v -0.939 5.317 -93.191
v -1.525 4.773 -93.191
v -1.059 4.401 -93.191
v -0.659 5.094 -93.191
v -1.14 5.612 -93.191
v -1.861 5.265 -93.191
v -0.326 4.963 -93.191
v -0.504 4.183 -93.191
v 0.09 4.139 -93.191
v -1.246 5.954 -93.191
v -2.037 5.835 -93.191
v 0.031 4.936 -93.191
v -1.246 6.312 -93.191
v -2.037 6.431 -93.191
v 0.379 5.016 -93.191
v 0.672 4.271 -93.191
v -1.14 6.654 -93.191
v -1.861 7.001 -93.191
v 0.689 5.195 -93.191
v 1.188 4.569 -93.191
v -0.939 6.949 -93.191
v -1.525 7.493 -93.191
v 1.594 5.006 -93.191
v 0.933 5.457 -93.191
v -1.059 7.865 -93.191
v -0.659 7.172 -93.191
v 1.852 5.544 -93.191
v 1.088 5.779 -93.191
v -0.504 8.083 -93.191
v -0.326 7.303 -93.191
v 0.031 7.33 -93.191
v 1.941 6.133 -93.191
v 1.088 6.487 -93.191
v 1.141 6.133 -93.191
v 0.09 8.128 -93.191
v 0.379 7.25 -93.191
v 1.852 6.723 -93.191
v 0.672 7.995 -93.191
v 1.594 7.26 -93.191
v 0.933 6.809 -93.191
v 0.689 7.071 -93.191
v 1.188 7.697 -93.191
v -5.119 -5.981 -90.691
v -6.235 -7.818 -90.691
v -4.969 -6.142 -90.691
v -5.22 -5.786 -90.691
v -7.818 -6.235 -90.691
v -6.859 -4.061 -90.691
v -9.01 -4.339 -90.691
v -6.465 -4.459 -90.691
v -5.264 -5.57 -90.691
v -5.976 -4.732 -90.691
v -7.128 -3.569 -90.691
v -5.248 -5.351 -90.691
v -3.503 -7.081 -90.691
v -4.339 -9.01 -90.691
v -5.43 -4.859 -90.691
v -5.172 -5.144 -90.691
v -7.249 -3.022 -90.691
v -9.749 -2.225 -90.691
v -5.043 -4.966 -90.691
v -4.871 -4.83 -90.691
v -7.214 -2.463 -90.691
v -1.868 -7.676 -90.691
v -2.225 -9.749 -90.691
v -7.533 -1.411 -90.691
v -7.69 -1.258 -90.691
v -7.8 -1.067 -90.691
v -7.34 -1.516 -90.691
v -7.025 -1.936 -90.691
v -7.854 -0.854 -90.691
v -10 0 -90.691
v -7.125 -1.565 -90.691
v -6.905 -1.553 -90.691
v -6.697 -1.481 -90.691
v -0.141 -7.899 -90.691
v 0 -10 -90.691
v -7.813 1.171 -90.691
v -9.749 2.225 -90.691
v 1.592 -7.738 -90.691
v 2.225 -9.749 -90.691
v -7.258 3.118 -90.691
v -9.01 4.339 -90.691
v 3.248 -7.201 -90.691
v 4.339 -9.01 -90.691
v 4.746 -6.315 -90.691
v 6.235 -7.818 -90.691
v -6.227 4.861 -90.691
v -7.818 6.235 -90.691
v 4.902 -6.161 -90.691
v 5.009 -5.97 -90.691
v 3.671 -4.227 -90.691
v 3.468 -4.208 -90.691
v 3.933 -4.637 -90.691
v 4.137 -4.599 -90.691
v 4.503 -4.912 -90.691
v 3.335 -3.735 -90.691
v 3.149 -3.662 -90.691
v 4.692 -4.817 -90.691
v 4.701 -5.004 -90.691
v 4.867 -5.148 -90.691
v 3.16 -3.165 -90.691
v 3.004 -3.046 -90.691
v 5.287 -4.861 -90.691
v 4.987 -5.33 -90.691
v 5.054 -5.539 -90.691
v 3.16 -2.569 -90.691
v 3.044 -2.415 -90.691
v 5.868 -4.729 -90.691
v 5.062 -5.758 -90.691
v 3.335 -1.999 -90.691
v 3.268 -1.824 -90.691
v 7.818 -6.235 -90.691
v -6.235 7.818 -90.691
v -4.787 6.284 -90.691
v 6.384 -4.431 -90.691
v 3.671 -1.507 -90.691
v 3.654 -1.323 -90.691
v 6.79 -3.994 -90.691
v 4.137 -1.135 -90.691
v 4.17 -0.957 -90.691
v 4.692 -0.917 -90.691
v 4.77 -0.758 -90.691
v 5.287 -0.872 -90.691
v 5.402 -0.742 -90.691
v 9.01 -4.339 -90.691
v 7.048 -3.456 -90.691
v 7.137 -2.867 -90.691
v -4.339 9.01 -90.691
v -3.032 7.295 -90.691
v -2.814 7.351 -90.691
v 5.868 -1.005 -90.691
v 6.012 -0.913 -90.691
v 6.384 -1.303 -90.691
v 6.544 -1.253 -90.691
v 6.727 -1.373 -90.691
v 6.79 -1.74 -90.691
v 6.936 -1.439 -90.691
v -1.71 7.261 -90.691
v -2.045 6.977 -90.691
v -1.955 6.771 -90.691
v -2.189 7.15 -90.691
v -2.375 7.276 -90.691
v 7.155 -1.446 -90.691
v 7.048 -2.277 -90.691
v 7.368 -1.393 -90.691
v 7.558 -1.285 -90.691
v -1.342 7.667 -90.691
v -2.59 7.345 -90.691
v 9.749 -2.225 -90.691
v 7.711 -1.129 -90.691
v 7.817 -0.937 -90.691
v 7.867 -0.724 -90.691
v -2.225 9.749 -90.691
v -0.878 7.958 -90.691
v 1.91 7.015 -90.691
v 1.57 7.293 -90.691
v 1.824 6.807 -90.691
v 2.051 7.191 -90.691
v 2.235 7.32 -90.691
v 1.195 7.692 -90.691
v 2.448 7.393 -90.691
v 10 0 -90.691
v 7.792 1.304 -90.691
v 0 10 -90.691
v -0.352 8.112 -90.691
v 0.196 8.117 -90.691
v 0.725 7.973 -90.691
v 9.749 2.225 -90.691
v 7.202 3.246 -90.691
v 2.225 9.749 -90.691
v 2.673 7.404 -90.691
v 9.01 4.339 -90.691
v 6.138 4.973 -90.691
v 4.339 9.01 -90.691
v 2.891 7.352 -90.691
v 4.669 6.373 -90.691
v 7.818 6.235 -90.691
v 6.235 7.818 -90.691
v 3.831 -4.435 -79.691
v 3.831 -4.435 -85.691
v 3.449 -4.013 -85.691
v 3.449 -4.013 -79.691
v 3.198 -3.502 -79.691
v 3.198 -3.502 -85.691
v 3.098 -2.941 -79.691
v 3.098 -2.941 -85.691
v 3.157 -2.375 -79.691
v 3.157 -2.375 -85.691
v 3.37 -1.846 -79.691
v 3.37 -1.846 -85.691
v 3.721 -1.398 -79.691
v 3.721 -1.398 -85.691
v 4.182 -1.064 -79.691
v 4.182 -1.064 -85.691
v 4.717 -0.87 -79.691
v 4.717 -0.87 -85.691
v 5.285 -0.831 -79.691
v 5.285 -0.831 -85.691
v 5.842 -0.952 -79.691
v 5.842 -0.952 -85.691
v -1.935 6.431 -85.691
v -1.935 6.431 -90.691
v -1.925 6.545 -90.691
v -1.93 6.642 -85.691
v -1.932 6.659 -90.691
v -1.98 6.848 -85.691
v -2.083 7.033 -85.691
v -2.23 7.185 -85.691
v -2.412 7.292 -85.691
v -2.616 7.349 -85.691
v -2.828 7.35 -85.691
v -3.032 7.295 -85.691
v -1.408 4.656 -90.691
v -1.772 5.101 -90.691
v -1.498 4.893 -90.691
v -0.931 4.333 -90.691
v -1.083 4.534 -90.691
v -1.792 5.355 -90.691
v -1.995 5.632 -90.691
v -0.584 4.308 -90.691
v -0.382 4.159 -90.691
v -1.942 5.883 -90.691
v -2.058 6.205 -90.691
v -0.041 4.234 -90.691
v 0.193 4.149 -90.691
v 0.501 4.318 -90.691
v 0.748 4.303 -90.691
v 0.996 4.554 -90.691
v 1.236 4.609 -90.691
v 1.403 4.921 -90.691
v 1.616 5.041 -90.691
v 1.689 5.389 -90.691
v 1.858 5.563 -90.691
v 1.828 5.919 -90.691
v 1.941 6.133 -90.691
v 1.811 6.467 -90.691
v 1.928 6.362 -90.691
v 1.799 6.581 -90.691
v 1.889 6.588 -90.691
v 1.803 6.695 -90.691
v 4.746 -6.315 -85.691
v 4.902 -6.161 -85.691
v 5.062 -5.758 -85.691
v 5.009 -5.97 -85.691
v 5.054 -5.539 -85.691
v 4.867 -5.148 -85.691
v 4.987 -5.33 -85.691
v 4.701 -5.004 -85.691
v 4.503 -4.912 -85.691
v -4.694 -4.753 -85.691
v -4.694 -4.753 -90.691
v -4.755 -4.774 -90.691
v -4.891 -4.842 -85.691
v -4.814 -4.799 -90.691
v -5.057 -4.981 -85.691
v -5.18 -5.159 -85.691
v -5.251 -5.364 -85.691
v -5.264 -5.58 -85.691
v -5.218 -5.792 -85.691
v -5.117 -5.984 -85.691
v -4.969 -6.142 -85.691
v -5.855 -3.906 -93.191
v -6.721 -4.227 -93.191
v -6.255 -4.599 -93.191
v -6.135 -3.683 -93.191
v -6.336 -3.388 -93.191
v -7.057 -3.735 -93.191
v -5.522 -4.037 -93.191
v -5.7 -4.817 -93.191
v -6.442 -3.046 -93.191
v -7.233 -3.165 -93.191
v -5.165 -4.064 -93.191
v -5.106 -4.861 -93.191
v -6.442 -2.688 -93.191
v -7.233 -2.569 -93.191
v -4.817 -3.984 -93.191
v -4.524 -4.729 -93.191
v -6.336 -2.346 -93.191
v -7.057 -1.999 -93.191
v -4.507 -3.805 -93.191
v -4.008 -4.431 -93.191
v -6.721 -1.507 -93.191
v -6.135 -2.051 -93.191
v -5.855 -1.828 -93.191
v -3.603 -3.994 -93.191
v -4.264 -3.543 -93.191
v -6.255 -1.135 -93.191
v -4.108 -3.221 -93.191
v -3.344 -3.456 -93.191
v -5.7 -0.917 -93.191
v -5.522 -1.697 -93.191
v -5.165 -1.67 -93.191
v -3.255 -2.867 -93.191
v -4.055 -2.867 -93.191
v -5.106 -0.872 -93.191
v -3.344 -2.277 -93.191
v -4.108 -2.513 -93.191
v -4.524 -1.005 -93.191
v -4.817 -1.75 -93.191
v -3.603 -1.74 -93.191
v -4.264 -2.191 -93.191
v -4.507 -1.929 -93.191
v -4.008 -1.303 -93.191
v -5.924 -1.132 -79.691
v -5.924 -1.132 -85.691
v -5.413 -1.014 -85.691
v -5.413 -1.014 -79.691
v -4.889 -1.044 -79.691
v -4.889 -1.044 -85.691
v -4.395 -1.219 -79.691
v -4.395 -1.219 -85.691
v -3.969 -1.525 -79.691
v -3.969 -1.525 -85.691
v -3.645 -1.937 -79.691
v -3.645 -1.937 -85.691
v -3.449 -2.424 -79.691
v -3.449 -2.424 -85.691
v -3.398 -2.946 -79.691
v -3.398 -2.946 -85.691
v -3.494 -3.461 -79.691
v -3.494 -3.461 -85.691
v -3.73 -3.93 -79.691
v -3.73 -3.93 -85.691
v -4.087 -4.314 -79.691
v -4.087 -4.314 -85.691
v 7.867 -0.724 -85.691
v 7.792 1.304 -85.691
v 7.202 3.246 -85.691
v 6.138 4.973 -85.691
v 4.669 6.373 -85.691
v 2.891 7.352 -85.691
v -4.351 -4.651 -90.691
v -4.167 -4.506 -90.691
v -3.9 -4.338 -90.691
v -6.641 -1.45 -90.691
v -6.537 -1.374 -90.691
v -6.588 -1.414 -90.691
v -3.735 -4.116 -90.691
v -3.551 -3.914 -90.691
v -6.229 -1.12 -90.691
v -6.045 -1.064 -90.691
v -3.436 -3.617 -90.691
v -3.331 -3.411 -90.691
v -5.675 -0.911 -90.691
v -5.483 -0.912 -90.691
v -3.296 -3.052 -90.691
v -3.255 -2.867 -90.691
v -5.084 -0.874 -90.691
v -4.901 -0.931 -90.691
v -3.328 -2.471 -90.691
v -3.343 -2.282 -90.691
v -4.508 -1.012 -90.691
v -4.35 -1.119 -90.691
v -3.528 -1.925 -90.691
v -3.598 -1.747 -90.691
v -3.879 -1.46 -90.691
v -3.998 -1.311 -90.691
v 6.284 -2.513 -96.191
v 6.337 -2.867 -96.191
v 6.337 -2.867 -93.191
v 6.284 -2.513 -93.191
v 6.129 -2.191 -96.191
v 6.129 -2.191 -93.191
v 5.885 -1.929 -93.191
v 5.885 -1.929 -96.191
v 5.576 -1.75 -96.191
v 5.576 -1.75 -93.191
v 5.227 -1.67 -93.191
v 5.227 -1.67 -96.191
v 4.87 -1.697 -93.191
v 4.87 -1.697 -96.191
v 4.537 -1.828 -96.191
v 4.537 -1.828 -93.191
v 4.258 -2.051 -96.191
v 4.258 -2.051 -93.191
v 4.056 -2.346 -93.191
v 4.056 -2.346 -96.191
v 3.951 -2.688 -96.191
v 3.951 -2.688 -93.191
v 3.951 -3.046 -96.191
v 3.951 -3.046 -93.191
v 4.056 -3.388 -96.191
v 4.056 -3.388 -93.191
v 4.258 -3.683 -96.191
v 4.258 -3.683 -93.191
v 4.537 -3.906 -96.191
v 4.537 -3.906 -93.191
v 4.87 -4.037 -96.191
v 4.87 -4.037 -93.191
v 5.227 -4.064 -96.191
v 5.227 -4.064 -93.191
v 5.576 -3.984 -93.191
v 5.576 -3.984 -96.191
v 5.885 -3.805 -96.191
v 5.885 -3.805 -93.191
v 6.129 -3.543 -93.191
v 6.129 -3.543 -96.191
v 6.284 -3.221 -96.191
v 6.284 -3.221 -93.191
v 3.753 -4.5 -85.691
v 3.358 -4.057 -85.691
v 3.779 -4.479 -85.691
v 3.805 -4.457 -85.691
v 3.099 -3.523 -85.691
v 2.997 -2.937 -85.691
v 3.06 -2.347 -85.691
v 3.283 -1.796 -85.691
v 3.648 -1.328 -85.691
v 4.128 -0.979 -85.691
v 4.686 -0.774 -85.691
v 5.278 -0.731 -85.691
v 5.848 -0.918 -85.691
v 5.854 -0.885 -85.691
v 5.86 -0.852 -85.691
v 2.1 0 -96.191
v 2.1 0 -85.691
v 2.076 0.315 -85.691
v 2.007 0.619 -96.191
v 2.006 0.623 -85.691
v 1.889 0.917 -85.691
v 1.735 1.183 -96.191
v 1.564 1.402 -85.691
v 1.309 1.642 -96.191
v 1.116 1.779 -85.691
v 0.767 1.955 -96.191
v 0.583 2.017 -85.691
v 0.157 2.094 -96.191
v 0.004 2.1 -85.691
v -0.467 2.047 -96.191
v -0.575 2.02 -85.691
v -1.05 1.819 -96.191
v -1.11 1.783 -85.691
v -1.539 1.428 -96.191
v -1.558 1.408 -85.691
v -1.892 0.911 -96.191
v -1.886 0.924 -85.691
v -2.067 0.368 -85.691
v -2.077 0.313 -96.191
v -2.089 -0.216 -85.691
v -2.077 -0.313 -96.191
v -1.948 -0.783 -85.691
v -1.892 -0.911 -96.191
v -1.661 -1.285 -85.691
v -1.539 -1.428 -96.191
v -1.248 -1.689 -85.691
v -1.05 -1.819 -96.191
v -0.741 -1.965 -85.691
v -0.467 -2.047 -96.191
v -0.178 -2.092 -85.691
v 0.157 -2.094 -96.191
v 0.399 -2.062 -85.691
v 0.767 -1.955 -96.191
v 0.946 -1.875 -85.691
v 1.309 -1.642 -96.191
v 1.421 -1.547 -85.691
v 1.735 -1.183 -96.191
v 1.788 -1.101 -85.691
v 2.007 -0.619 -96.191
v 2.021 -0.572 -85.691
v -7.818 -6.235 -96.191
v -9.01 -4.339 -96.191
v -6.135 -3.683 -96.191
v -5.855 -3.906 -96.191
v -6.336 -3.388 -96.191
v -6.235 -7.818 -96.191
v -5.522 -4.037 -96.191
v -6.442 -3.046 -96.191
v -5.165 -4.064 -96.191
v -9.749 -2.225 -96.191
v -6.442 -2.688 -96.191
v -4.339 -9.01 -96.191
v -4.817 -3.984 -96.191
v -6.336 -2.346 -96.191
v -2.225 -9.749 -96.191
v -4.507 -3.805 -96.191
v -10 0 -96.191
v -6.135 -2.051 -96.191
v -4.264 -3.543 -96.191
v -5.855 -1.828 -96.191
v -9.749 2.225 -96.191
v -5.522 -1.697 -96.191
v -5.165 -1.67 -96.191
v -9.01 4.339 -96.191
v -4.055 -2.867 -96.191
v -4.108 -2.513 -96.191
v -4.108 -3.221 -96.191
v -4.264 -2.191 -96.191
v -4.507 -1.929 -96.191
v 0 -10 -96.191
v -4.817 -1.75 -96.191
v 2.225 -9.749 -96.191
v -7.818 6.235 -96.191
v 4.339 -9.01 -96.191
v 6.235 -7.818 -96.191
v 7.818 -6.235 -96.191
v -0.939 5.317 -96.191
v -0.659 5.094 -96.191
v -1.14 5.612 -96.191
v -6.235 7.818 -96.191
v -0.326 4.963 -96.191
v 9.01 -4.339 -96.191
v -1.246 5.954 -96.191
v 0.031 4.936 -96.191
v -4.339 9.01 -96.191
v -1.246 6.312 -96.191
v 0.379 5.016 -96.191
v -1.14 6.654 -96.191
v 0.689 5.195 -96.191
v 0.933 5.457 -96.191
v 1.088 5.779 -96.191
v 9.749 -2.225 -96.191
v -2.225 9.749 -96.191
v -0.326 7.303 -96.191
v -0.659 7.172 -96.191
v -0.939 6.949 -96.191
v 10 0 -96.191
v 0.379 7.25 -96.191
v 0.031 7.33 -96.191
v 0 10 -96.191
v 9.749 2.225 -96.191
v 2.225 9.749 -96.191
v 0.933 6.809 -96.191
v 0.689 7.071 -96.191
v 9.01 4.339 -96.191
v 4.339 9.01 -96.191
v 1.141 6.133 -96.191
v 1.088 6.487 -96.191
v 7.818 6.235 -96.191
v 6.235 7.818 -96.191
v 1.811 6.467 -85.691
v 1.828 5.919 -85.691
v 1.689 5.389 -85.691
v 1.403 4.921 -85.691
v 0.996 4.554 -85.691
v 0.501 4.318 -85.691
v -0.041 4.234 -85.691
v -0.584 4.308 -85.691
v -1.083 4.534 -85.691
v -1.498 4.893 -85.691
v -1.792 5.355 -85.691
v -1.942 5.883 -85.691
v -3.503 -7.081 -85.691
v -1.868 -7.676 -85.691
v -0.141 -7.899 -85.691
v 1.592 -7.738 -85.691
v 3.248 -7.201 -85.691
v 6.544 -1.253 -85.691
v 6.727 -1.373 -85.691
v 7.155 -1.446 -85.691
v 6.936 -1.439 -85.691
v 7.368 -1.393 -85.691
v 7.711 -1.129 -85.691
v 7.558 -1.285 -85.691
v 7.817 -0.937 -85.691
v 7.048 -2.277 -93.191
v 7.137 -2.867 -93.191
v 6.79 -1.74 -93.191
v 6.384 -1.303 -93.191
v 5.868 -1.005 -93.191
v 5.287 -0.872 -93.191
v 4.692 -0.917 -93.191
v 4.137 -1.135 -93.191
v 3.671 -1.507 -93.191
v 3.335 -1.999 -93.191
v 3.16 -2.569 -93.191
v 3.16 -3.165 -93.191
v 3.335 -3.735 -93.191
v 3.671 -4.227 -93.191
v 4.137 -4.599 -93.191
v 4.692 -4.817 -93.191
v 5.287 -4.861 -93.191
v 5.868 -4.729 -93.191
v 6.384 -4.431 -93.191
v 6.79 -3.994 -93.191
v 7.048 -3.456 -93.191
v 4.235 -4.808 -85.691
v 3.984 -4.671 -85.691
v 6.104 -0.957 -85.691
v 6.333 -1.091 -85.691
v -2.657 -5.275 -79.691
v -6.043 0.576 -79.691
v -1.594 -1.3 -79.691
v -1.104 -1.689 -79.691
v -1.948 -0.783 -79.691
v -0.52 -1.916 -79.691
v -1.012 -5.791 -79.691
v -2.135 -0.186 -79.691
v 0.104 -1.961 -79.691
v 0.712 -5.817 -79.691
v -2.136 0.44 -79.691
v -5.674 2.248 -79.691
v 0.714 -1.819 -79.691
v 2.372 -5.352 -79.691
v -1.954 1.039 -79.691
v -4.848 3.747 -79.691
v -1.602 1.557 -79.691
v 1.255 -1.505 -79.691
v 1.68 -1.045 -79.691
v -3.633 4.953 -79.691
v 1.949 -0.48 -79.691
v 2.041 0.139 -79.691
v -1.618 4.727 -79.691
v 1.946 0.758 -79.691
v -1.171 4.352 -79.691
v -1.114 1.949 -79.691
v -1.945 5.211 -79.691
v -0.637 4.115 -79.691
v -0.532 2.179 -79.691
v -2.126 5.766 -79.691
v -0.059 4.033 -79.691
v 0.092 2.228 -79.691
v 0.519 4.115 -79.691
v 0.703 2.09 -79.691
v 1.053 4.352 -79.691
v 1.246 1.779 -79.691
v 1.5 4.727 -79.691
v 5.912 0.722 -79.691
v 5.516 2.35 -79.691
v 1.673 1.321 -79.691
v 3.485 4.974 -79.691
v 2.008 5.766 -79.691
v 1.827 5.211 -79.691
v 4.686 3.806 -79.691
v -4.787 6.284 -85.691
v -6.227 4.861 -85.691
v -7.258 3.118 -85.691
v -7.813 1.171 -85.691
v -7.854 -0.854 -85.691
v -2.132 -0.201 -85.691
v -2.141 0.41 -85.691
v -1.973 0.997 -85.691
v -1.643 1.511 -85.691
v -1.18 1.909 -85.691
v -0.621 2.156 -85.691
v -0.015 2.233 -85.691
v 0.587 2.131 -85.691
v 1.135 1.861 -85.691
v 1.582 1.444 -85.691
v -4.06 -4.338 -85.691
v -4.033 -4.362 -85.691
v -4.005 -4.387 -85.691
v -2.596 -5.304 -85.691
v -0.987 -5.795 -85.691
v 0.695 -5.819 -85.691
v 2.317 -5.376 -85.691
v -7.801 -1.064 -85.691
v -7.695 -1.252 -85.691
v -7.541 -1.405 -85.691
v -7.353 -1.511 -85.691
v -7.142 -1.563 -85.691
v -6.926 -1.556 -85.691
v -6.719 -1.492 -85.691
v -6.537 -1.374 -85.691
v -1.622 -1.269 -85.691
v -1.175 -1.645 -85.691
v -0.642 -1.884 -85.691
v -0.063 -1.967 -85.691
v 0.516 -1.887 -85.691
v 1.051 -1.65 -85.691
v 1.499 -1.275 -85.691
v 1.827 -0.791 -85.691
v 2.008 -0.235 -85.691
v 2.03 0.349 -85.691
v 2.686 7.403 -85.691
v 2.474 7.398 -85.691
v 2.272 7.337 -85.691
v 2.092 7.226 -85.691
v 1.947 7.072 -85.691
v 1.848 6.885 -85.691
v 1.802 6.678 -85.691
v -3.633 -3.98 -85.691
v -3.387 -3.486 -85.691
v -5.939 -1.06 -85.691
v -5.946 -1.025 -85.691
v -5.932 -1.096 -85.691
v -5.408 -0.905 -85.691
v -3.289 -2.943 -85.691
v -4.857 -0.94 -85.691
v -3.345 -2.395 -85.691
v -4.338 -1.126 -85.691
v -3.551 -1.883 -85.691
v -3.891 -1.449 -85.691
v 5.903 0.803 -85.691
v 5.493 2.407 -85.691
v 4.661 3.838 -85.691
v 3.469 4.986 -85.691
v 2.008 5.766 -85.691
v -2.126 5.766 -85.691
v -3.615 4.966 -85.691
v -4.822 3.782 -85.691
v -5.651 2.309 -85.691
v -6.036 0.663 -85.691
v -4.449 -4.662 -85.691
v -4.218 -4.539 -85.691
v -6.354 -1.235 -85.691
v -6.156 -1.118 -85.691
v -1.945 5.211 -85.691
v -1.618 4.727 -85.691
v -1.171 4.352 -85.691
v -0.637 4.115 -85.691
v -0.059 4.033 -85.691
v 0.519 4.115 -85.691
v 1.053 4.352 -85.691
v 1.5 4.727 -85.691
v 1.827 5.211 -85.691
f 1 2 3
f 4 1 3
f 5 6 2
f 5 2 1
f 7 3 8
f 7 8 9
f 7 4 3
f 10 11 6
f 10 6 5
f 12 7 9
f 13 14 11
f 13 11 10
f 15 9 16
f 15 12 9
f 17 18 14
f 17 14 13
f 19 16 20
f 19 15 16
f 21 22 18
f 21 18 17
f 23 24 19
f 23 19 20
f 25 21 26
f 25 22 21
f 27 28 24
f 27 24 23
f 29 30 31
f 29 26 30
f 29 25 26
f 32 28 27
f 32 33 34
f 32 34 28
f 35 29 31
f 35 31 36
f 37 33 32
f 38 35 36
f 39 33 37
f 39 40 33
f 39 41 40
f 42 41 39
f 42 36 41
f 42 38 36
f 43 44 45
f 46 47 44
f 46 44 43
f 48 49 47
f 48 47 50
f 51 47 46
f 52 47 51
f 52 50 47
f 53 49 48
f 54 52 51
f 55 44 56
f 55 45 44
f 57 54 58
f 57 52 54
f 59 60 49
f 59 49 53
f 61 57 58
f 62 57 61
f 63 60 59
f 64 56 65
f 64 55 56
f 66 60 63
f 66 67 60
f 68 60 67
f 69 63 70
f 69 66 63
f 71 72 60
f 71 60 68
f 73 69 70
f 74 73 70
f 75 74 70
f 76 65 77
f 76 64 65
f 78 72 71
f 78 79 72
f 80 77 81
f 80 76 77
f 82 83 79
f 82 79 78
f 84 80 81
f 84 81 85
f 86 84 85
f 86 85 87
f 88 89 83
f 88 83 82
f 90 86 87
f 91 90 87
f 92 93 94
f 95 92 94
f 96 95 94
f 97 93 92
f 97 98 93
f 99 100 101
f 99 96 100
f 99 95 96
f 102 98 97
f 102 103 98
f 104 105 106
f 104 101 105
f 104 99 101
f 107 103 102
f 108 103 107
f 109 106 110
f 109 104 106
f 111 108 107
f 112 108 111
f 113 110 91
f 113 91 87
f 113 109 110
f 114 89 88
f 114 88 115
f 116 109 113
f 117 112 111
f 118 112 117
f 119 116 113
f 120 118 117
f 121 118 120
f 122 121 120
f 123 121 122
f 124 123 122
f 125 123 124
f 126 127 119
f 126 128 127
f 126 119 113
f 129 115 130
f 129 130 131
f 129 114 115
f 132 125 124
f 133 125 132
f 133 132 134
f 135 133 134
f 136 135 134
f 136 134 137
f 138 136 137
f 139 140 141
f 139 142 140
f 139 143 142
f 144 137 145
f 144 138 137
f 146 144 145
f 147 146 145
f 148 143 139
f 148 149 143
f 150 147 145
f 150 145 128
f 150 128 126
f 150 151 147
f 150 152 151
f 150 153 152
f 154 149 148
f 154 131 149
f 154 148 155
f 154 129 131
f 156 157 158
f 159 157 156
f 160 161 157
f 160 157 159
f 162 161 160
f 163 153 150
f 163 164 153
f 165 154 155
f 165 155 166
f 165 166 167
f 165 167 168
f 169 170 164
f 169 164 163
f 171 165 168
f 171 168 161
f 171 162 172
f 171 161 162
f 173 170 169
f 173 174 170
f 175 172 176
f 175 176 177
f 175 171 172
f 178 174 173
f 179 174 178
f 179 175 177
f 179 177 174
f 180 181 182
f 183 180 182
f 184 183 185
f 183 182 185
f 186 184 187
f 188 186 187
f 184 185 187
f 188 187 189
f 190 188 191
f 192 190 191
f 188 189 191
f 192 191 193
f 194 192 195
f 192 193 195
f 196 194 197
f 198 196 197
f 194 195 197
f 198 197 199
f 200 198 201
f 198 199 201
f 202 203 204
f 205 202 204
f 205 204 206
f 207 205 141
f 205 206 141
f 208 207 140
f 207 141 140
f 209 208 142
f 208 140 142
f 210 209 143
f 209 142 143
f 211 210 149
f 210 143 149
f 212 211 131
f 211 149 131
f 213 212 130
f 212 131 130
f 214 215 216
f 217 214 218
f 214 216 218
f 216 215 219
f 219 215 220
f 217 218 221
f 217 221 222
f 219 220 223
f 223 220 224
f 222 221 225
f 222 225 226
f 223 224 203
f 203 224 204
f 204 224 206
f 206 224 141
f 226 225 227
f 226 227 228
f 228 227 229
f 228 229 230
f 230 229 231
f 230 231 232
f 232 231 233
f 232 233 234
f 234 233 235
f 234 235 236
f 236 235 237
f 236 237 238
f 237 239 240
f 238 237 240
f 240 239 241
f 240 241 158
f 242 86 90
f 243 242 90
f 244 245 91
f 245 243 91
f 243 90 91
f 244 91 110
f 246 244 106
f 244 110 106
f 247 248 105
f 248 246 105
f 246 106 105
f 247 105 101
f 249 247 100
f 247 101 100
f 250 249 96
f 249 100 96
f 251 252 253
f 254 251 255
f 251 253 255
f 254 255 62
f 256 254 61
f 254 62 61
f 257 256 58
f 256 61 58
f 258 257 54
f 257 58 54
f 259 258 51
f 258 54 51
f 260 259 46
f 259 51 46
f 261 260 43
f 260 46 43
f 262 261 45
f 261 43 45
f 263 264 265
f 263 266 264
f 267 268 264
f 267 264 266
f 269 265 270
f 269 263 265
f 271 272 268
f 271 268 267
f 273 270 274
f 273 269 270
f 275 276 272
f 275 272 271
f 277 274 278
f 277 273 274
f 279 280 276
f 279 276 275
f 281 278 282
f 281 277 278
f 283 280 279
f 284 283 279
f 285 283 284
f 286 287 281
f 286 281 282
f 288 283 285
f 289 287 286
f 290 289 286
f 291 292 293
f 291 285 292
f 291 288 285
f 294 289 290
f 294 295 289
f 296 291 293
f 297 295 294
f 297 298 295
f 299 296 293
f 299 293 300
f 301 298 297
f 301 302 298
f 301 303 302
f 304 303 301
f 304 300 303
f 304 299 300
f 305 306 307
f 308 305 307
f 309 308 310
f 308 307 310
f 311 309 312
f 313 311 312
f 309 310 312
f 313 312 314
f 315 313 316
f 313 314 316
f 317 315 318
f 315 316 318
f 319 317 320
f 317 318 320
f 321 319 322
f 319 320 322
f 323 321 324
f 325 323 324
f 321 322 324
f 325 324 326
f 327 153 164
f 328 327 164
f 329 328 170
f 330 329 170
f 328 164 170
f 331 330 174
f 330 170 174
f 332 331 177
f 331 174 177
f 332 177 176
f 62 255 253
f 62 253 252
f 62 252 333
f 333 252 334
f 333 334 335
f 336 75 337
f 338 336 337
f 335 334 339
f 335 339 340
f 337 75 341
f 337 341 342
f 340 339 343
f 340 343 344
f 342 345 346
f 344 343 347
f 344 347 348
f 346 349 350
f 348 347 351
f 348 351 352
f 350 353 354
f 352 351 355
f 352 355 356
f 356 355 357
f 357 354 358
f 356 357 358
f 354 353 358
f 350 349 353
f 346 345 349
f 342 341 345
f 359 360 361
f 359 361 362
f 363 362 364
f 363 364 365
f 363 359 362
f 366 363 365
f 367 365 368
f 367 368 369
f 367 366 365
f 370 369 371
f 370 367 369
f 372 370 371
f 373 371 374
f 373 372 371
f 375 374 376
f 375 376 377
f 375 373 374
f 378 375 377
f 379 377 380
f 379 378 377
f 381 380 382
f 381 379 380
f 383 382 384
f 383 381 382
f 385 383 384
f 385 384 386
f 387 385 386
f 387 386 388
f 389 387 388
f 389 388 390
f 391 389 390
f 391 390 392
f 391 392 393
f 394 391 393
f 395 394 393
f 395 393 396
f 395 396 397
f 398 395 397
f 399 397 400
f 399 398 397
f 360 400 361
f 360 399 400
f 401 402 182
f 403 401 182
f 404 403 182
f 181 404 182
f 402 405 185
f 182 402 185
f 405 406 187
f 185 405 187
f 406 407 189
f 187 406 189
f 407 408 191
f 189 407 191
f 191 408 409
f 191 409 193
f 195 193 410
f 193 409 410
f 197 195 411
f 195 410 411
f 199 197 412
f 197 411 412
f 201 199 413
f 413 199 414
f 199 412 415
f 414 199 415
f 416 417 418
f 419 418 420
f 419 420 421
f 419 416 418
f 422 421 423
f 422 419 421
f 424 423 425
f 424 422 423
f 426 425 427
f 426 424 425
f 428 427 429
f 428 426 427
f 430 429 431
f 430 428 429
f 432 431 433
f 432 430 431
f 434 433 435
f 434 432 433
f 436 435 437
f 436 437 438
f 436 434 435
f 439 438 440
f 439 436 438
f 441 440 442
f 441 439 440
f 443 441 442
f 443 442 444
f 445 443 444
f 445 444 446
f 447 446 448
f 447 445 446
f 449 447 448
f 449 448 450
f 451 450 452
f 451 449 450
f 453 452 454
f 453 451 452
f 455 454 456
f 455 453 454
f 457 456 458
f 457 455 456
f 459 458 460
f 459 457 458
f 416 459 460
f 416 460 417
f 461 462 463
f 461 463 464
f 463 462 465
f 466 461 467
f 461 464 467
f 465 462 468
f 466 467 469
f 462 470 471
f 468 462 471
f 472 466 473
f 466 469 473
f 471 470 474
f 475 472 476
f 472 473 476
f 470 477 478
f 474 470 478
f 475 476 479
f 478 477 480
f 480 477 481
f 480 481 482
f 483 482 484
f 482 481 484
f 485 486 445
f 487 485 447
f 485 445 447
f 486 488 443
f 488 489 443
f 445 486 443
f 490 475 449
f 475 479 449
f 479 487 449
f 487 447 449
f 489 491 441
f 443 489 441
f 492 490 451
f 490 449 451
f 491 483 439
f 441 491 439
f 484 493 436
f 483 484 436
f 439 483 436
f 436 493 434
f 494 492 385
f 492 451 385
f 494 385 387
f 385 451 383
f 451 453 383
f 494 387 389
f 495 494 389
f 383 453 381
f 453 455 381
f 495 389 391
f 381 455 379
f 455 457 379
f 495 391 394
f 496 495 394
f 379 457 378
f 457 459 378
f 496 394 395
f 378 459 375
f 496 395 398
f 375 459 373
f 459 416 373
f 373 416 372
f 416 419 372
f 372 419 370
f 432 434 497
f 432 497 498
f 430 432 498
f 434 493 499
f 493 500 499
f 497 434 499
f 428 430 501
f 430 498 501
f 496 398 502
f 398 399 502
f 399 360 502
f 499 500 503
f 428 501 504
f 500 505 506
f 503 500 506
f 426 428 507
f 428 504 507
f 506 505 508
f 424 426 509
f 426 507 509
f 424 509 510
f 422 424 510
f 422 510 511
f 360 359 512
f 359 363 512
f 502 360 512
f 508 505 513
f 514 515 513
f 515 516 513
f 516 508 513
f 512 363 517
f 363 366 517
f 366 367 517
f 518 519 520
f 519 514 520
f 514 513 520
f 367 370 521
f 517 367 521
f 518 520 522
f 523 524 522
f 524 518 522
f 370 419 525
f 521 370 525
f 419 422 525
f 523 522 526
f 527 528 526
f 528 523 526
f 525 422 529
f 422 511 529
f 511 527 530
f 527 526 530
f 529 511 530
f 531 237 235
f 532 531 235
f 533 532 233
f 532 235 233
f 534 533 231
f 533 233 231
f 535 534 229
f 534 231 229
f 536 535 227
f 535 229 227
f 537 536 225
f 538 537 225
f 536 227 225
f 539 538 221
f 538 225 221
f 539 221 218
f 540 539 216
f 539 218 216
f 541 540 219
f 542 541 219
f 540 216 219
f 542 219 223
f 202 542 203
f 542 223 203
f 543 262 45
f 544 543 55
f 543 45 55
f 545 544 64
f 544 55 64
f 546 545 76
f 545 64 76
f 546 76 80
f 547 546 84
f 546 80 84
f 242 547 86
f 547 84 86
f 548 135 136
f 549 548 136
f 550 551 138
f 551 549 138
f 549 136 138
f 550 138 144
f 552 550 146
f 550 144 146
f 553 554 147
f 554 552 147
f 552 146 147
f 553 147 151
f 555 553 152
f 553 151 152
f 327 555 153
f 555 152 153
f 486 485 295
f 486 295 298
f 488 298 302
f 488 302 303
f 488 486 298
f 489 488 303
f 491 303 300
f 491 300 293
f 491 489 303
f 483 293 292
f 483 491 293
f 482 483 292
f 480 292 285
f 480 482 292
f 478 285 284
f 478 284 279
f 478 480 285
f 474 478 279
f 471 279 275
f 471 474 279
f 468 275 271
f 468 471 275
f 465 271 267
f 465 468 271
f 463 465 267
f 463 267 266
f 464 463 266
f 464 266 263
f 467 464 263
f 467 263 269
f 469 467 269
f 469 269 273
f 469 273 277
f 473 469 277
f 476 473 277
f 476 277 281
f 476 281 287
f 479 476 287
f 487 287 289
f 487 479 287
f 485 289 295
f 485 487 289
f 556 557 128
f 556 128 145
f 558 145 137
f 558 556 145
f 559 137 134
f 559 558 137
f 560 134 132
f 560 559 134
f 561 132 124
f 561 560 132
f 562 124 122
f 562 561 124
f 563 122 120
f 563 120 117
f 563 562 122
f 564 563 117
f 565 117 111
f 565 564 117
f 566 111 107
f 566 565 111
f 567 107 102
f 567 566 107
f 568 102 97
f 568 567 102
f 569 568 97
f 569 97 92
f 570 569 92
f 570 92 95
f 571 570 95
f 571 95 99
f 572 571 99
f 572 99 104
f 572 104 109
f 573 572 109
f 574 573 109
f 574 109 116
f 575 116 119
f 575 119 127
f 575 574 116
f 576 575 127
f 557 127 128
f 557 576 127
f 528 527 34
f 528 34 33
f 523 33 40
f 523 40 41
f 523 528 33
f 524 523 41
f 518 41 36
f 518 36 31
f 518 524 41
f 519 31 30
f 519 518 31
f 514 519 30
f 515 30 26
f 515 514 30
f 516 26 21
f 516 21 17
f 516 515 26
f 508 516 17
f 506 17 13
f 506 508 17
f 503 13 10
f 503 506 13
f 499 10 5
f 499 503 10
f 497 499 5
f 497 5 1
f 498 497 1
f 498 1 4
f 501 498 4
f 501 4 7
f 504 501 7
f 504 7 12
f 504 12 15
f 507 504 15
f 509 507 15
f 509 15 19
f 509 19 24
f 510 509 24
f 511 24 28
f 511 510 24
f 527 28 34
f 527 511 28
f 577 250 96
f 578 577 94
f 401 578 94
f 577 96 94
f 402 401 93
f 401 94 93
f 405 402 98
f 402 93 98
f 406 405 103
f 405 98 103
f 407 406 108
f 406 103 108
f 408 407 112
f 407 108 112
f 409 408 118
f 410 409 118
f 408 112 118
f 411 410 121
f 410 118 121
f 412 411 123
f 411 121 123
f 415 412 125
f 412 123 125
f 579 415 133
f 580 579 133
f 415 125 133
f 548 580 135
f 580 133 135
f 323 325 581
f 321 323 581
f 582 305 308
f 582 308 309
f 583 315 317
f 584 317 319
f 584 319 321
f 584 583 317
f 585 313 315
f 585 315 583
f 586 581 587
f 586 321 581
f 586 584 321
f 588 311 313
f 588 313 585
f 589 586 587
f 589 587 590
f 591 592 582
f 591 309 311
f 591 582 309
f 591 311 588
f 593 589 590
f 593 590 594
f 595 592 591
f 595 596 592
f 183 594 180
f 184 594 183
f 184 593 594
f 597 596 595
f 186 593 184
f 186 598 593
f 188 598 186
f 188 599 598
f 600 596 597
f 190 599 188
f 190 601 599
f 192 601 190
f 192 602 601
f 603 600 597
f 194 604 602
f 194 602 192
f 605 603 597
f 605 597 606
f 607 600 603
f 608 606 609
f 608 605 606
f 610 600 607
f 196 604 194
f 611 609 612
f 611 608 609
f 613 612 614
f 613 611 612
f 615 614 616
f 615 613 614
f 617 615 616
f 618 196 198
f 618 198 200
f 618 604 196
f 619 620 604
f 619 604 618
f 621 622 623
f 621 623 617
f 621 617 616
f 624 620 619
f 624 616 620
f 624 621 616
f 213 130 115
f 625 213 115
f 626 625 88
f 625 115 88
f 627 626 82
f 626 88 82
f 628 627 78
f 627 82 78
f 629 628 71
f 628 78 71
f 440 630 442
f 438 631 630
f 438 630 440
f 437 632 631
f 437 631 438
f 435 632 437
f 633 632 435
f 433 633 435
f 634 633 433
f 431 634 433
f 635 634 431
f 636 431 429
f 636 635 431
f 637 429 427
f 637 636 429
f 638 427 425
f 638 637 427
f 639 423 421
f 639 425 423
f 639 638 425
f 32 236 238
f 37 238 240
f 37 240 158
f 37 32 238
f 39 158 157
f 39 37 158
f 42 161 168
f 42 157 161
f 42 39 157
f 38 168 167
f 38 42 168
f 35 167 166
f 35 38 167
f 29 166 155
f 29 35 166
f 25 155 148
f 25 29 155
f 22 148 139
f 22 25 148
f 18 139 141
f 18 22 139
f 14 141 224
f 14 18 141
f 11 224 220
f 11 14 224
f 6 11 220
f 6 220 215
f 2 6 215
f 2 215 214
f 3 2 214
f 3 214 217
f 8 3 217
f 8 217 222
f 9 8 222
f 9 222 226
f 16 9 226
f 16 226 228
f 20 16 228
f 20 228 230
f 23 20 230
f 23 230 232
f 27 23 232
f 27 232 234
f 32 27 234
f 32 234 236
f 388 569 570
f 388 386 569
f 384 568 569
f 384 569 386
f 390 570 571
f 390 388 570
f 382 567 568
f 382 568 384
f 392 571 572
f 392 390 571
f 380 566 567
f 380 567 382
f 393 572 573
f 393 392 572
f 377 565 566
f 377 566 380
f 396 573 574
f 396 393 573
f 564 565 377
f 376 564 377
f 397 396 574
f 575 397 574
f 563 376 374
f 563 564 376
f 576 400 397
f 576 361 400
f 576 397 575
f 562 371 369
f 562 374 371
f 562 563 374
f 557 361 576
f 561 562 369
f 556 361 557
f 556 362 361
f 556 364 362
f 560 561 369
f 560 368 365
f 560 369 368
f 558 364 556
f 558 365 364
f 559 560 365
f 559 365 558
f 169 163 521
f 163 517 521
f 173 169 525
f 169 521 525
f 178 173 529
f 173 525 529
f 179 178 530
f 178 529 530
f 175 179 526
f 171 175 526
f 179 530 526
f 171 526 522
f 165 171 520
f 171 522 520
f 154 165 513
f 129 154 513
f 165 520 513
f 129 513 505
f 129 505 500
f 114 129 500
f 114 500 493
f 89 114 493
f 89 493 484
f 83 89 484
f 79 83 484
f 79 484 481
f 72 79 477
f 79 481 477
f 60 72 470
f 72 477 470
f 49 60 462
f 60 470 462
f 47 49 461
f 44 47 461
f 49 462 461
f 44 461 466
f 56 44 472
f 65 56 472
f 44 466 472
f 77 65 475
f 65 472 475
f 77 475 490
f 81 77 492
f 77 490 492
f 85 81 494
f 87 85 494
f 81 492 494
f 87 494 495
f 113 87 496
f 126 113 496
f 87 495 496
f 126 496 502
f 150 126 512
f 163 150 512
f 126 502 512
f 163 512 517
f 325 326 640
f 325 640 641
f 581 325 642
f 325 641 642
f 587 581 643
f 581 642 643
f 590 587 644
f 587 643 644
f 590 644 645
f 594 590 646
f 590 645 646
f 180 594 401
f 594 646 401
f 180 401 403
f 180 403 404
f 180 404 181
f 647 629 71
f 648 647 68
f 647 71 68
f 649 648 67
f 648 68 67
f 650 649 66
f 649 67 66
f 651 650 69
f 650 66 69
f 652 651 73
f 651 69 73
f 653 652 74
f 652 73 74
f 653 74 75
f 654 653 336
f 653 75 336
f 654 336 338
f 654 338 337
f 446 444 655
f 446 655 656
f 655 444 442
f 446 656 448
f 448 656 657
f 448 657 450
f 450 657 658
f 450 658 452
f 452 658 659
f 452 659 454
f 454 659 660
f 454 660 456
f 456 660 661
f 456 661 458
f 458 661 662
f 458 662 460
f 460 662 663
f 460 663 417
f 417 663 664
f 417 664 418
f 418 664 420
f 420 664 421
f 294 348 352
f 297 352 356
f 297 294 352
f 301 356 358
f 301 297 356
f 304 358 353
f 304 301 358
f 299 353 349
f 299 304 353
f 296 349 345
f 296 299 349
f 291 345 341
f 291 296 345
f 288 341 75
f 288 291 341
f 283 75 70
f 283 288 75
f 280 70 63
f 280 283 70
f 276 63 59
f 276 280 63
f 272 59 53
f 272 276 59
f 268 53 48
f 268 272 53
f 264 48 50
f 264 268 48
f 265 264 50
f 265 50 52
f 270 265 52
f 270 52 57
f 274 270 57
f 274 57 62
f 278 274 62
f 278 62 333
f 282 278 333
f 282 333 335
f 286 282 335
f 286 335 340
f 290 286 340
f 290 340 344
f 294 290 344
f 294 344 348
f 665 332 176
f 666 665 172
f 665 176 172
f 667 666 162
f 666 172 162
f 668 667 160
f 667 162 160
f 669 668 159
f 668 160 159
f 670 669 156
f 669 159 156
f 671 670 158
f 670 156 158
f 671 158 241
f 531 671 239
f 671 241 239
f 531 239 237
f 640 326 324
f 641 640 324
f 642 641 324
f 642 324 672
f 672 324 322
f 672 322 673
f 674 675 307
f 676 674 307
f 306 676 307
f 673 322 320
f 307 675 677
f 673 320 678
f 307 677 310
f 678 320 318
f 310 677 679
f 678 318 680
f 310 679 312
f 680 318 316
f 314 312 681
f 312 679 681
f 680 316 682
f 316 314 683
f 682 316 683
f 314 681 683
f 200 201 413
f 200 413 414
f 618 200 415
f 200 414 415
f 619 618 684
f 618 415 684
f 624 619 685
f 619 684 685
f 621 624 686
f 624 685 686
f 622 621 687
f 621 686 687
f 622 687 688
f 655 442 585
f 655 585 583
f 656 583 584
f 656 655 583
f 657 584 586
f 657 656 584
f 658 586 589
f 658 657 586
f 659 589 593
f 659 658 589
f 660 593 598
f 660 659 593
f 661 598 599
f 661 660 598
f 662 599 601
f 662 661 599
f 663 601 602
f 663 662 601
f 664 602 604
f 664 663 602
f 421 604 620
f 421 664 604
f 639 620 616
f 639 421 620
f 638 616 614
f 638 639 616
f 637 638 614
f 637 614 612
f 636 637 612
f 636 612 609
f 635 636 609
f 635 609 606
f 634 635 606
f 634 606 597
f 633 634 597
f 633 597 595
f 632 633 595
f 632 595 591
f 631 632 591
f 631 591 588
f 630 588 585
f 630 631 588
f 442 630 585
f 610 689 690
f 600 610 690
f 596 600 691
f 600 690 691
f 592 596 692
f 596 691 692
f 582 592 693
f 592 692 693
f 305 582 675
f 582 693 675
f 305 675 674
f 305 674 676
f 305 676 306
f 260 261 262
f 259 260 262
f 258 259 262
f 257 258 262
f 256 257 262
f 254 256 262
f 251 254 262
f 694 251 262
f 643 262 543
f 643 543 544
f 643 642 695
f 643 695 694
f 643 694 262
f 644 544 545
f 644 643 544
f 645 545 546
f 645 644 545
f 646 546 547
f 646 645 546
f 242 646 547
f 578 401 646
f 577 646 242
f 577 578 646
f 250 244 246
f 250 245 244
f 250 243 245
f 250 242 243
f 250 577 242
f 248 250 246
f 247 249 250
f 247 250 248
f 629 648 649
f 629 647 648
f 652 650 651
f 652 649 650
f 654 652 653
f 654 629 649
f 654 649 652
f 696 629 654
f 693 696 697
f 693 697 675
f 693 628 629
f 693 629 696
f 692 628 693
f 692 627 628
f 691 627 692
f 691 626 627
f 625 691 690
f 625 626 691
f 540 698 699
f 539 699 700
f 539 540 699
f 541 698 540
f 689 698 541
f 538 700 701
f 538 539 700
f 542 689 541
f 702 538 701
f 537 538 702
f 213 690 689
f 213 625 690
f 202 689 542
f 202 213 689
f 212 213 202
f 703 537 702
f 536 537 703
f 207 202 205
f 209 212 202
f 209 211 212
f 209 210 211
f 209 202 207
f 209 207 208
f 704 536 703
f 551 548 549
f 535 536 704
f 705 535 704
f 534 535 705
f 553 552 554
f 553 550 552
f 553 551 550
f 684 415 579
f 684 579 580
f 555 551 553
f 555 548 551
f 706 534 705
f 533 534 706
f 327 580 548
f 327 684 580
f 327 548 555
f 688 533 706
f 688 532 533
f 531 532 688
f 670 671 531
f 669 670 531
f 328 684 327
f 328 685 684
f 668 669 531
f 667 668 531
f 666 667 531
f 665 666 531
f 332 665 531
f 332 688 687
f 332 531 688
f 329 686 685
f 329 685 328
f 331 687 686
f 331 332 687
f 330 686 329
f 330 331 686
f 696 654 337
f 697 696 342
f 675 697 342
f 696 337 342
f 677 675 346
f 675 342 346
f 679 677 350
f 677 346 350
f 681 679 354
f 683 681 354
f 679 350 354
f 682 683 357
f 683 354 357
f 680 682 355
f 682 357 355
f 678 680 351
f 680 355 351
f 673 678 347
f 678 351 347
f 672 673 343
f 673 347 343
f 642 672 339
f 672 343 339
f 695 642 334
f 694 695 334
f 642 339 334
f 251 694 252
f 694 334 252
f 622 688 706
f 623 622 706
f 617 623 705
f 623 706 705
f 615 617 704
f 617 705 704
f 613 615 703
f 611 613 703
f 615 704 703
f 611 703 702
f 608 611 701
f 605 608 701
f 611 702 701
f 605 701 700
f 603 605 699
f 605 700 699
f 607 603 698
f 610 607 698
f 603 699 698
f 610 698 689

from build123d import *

# Parameters (mm, degrees)
SKETCH2_R           = 10
SKETCH2_R_2         = 2.1
SKETCH2_R_3         = 1.2
BOSS_EXTRUDE1_DEPTH = 3
SKETCH3_R           = 10
SKETCH3_R_2         = 2
SKETCH3_R_3         = 2.1
BOSS_EXTRUDE2_DEPTH = 2.5
SKETCH4_R           = 2.1
BOSS_EXTRUDE3_DEPTH = 5
FILLET1_R           = 0.8
SKETCH5_R           = 2.1
BOSS_EXTRUDE4_DEPTH = 6


with BuildPart() as part:
    # Sketch2 → Boss-Extrude1 (new body)
    with BuildSketch(Plane.XY.offset(-96.191169136)):
        Circle(SKETCH2_R)
        Circle(SKETCH2_R_2, mode=Mode.SUBTRACT)
        with Locations((-0.05897353, 6.133133301)):
            Circle(SKETCH2_R_3, mode=Mode.SUBTRACT)
        with Locations((5.137178892, -2.866866699)):
            Circle(SKETCH2_R_3, mode=Mode.SUBTRACT)
        with Locations((-5.255125953, -2.866866699)):
            Circle(SKETCH2_R_3, mode=Mode.SUBTRACT)
    extrude(amount=BOSS_EXTRUDE1_DEPTH)

    # Sketch3 → Boss-Extrude2 (add)
    with BuildSketch(Plane.XY.offset(-93.191169136)):
        Circle(SKETCH3_R)
        with Locations((-5.255125953, -2.866866699)):
            Circle(SKETCH3_R_2, mode=Mode.SUBTRACT)
        with Locations((-0.05897353, 6.133133301)):
            Circle(SKETCH3_R_2, mode=Mode.SUBTRACT)
        with Locations((5.137178892, -2.866866699)):
            Circle(SKETCH3_R_2, mode=Mode.SUBTRACT)
        Circle(SKETCH3_R_3, mode=Mode.SUBTRACT)
    extrude(amount=BOSS_EXTRUDE2_DEPTH)

    # Sketch4 → Boss-Extrude3 (add)
    with BuildSketch(Plane.XY.offset(-90.691169136)):
        with BuildLine():
            ThreePointArc((7.264990173, -3.103210883), (6.783257612, 4.049372318), (0.715851765, 7.8675))
            ThreePointArc((0.715851765, 7.8675), (-0.040708899, 4.233646925), (-0.867006302, 7.852279928))
            ThreePointArc((-0.867006302, 7.852279928), (-6.879264147, 3.884034604), (-7.171380747, -3.313804186))
            ThreePointArc((-7.171380747, -3.313804186), (-3.527763738, -1.924526353), (-6.668183396, -4.236192889))
            ThreePointArc((-6.668183396, -4.236192889), (-0.191069364, -7.897689061), (6.455528982, -4.553695814))
            ThreePointArc((6.455528982, -4.553695814), (3.267691347, -1.823575878), (7.264990173, -3.103210883))
        make_face()
        Circle(SKETCH4_R, mode=Mode.SUBTRACT)
    extrude(amount=BOSS_EXTRUDE3_DEPTH)

    # Fillet1
    # the kernel refuses this fillet: 0.8 mm, written as the material it takes off along each edge
    with BuildSketch(Plane(origin=(-0.867006302, 7.852279928, -90.691169136), x_dir=(-0.9684268820768696, -0.24929776186494912, 0), z_dir=(0, 0, 1))) as fillet1_piece_1:
        with BuildLine():
            CenterArc((2.122639751, 0.791949539), FILLET1_R, 156.548445833, 121.586747485)
            ThreePointArc((1.388722227, 1.110328352), (0.832290223, 0.382651946), (0, 0))
            ThreePointArc((0, 0), (1.117923602, -0.079498301), (2.235847204, 0))
        make_face()
    extrude(amount=10.589618011, mode=Mode.SUBTRACT)
    with BuildSketch(Plane(origin=(-7.171380747, -3.313804186, -90.691169136), x_dir=(-0.2672810953743128, 0.9636186050795758, 0), z_dir=(0, 0, 1))) as fillet1_piece_2:
        with BuildLine():
            CenterArc((2.423675061, -0.789487911), FILLET1_R, 80.701479552, 124.454730774)
            ThreePointArc((1.699553301, -1.129558017), (1.007651544, -0.327237606), (0, 0))
            ThreePointArc((0, 0), (1.276468866, 0.103806875), (2.552937731, 0))
        make_face()
    extrude(amount=11.382344328, mode=Mode.SUBTRACT)
    with BuildSketch(Plane(origin=(-6.668183396, -4.236192889, -90.691169136), x_dir=(0.9674204056157966, -0.2531753518772465, 0), z_dir=(0, 0, 1))) as fillet1_piece_3:
        with BuildLine():
            CenterArc((2.455521009, -0.684038404), FILLET1_R, 121.234961486, 124.454730774)
            ThreePointArc((2.126178356, -1.413101787), (1.005630009, -0.793004992), (0, 0))
            ThreePointArc((0, 0), (1.020340965, -0.285219915), (2.040681929, 0))
        make_face()
    extrude(amount=11.382344328, mode=Mode.SUBTRACT)
    with BuildSketch(Plane(origin=(6.455528982, -4.553695814, -90.691169136), x_dir=(-0.9836137954546407, -0.18028838396113095, 0), z_dir=(0, 0, 1))) as fillet1_piece_4:
        with BuildLine():
            CenterArc((2.356185075, 0.708813813), FILLET1_R, 116.541300521, 125.835667041)
            ThreePointArc((1.998710841, 1.42450381), (0.943696464, 0.790346579), (0, 0))
            ThreePointArc((0, 0), (0.99263164, 0.244025278), (1.98526328, 0))
        make_face()
    extrude(amount=11.13598817, mode=Mode.SUBTRACT)
    with BuildSketch(Plane(origin=(7.264990173, -3.103210883, -90.691169136), x_dir=(0.2451881288110309, 0.969475518767826, 0), z_dir=(0, 0, 1))) as fillet1_piece_5:
        with BuildLine():
            CenterArc((2.33012209, 0.790288667), FILLET1_R, 153.100934038, 125.835667041)
            ThreePointArc((1.616678166, 1.152224804), (0.94996865, 0.377392996), (0, 0))
            ThreePointArc((0, 0), (1.227197634, -0.095899413), (2.454395268, 0))
        make_face()
    extrude(amount=11.13598817, mode=Mode.SUBTRACT)
    with BuildSketch(Plane(origin=(0.715851765, 7.8675, -90.691169136), x_dir=(0.6159695110319643, -0.7877699927510841, 0), z_dir=(0, 0, 1))) as fillet1_piece_6:
        with BuildLine():
            CenterArc((2.152431859, 0.70697997), FILLET1_R, 120.508273334, 121.586747485)
            ThreePointArc((1.746301639, 1.396224661), (0.823506332, 0.760204236), (0, 0))
            ThreePointArc((0, 0), (0.889013284, 0.22087306), (1.778026567, 0))
        make_face()
    extrude(amount=10.589618011, mode=Mode.SUBTRACT)

    # Sketch5 → Boss-Extrude4 (add)
    with BuildSketch(Plane.XY.offset(-85.691169136)):
        with BuildLine():
            ThreePointArc((5.84214559, -0.951667659), (5.152070119, 3.107191821), (2.00838279, 5.765720437))
            ThreePointArc((2.00838279, 5.765720437), (-0.05897353, 4.033382276), (-2.126329851, 5.765720437))
            ThreePointArc((-2.126329851, 5.765720437), (-5.315006226, 3.026940535), (-5.924054987, -1.132101661))
            ThreePointArc((-5.924054987, -1.132101661), (-3.644953029, -1.937232928), (-4.087239877, -4.313558756))
            ThreePointArc((-4.087239877, -4.313558756), (-0.150972365, -5.866161342), (3.831051219, -4.434985289))
            ThreePointArc((3.831051219, -4.434985289), (3.369772867, -1.846454355), (5.84214559, -0.951667659))
        make_face()
        with Locations(Location((-0.05897353, 0.133133301, 0), (0, 0, 205.878507887))):
            Circle(SKETCH5_R, mode=Mode.SUBTRACT)
    extrude(amount=BOSS_EXTRUDE4_DEPTH)


solid = part.part
